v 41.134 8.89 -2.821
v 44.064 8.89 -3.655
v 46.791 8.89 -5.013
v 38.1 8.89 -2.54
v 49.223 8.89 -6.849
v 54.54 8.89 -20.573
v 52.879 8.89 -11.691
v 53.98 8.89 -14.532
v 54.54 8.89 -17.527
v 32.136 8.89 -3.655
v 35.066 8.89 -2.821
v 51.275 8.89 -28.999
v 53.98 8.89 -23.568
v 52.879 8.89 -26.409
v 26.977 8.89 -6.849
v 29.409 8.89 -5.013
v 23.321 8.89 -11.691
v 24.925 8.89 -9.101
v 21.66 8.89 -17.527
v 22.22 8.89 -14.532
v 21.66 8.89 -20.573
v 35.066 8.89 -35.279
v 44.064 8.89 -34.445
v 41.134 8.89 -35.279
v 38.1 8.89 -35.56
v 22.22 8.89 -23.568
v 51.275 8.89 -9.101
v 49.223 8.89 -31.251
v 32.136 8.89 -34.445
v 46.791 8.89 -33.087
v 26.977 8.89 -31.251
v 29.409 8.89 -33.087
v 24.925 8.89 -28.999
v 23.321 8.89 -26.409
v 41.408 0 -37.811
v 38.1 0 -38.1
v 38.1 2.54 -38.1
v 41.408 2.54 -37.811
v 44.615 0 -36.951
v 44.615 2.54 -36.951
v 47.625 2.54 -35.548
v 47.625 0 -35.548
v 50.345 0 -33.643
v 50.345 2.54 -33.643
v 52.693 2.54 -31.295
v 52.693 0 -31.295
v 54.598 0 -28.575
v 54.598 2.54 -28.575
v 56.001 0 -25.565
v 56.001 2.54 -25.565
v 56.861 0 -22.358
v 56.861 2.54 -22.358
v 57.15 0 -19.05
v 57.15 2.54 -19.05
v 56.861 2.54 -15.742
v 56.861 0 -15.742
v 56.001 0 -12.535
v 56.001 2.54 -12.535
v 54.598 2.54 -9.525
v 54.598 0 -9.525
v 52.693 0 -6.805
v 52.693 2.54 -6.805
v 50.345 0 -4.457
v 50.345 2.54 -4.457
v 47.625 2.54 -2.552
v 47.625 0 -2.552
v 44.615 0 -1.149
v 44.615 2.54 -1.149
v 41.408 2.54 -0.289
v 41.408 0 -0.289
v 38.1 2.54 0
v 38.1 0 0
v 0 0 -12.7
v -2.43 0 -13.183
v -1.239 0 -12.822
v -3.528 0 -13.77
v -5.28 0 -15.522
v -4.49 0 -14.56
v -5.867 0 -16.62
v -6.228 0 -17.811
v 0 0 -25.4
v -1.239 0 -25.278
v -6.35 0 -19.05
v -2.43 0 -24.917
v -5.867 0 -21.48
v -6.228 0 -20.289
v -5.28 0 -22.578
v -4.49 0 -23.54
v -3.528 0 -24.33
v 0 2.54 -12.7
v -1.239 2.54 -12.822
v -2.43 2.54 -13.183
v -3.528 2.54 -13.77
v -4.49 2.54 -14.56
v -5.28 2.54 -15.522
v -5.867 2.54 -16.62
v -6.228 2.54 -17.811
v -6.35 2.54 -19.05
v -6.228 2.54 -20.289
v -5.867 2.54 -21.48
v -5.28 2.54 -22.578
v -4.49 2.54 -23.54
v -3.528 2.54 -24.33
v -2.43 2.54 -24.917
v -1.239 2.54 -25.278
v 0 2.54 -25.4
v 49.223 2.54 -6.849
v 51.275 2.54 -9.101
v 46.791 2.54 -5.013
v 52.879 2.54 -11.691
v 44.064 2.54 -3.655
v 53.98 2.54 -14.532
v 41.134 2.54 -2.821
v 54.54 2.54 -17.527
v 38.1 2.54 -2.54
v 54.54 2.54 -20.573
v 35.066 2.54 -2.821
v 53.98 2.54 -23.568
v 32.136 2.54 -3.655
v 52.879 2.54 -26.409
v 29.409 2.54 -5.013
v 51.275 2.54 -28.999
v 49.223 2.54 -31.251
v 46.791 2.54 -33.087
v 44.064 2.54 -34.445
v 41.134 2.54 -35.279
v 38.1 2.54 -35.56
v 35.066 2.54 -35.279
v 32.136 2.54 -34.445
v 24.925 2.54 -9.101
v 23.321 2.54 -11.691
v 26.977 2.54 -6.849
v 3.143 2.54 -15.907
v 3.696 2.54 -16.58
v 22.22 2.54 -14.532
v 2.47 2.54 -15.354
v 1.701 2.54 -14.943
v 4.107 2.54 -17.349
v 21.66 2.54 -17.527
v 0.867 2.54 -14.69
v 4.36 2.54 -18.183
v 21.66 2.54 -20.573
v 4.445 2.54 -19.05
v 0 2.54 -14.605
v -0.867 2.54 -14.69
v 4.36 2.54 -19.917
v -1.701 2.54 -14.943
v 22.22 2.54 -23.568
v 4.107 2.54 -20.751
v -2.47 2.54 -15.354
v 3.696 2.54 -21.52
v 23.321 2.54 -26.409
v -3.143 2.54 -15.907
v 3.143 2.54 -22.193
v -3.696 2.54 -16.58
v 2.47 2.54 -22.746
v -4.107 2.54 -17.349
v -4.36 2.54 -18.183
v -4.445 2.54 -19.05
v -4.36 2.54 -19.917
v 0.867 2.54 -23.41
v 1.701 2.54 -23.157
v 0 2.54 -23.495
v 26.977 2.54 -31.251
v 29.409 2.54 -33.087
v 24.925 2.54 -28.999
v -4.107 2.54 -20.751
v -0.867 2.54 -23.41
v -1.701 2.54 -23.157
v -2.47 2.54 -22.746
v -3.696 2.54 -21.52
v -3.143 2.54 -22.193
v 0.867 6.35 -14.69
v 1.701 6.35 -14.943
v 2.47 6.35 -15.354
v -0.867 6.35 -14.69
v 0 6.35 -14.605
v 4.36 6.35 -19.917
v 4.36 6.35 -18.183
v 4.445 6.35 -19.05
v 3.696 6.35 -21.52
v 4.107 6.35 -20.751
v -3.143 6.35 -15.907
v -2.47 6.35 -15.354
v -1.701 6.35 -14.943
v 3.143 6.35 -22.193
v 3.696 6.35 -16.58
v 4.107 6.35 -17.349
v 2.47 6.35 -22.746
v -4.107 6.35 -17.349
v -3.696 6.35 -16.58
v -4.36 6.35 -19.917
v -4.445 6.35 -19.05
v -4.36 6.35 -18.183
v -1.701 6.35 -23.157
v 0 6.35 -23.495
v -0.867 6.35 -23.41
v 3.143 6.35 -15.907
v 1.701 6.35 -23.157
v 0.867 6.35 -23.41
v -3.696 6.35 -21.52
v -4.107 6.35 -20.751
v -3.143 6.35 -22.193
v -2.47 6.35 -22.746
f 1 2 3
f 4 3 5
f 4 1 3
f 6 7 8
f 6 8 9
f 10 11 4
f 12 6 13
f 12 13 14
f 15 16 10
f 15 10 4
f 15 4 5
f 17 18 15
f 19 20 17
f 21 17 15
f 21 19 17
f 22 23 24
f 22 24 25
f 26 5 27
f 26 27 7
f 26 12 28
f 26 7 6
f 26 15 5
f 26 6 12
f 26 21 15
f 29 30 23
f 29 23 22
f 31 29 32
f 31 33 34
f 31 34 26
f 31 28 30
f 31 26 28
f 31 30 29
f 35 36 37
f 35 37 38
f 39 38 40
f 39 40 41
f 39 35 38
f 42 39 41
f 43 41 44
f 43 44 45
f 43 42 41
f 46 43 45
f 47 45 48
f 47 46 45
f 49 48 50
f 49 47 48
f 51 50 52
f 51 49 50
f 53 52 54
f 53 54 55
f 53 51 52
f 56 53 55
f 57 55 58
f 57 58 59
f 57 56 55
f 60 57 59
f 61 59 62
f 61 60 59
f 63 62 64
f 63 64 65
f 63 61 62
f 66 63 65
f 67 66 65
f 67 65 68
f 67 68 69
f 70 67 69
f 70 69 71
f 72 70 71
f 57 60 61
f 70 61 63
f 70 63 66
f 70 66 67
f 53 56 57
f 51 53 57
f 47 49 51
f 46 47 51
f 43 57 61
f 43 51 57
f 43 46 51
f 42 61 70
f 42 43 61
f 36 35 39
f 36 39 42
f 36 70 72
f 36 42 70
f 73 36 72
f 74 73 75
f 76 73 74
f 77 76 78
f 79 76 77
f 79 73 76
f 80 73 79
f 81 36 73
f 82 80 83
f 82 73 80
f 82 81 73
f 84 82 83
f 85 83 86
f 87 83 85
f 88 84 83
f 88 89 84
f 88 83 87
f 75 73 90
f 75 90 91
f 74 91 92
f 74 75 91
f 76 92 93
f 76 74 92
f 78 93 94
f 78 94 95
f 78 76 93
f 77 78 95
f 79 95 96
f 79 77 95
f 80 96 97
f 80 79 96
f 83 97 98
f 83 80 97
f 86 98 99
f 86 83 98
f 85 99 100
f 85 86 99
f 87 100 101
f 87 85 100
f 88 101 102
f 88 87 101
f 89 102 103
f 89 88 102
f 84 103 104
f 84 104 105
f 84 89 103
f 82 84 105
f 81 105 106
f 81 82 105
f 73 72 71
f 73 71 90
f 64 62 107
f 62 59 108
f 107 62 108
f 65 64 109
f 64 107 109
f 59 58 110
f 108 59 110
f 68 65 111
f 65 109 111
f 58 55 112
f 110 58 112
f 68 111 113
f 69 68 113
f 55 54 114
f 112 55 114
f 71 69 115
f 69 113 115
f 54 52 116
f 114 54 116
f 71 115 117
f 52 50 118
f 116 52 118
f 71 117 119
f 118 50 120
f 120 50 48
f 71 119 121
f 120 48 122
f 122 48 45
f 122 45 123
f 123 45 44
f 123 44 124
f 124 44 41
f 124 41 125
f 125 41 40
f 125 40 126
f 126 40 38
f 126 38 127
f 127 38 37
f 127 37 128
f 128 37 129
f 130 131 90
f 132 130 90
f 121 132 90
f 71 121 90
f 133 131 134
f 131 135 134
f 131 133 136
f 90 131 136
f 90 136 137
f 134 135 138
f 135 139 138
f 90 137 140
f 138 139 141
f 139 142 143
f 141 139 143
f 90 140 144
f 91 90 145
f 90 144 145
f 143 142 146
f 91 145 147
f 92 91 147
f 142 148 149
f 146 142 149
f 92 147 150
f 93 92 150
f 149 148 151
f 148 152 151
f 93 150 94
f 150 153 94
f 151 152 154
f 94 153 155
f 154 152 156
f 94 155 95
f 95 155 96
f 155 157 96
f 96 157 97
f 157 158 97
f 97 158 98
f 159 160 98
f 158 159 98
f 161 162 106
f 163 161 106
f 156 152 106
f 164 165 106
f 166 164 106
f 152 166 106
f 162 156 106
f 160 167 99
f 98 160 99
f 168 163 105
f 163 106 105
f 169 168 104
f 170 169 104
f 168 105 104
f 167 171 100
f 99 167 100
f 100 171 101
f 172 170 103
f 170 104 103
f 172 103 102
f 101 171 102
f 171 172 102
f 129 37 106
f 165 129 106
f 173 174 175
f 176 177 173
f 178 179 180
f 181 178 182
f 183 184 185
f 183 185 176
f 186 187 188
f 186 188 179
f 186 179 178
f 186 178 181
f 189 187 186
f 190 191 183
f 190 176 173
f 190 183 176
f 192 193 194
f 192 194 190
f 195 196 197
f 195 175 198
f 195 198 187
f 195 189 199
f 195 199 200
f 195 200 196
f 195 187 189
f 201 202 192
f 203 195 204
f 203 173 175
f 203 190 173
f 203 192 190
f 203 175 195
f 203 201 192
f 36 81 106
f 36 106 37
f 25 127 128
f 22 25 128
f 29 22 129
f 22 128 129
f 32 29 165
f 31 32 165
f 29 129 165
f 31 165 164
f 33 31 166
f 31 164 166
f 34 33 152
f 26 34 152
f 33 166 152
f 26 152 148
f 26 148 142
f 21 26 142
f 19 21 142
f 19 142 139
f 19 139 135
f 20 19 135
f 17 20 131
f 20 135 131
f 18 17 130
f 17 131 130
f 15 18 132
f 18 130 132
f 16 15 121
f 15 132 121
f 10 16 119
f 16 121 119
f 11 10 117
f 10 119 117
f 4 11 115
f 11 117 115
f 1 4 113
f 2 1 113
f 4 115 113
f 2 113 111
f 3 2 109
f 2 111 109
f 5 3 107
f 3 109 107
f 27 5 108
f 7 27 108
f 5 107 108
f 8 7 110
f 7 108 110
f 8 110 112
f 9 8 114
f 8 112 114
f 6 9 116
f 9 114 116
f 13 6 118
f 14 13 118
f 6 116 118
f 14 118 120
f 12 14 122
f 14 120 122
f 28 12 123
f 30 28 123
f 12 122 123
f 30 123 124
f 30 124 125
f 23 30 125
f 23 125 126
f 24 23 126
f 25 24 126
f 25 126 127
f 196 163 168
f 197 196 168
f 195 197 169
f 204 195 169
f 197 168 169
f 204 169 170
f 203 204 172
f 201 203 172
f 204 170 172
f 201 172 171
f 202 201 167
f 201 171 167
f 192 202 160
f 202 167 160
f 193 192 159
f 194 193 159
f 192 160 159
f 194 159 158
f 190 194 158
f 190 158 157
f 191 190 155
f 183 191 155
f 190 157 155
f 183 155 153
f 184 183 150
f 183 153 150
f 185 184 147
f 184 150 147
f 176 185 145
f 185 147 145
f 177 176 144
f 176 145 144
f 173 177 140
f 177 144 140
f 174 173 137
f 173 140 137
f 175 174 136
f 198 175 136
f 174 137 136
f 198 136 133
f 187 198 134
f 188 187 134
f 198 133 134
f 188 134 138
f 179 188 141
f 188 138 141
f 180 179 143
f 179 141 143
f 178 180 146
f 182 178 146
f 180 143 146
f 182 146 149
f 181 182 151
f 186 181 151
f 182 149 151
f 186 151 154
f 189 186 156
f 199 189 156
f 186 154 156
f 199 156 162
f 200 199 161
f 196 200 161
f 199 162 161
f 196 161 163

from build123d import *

# Parameters (mm, degrees)
BOSS_EXTRUDE1_DEPTH = 2.54
SKETCH2_R           = 16.51
BOSS_EXTRUDE2_DEPTH = 6.35
SKETCH3_R           = 4.445
BOSS_EXTRUDE3_DEPTH = 3.81


with BuildPart() as part:
    # Sketch1 → Boss-Extrude1 (new body)
    with BuildSketch(Plane(origin=(0, 0, 0), x_dir=(1, 0, 0), z_dir=(0, 1, 0))):
        with BuildLine():
            Line((0, 25.4), (38.1, 38.1))
            ThreePointArc((38.1, 38.1), (57.15, 19.05), (38.1, 0))
            Line((38.1, 0), (0, 12.7))
            ThreePointArc((0, 12.7), (-6.35, 19.05), (0, 25.4))
        make_face()
    extrude(amount=BOSS_EXTRUDE1_DEPTH)

    # Sketch2 → Boss-Extrude2 (add)
    with BuildSketch(Plane(origin=(0, 2.54, 0), x_dir=(1, 0, 0), z_dir=(0, 1, 0))):
        with Locations(Location((38.1, 19.05, 0), (0, 0, 90))):
            Circle(SKETCH2_R)
    extrude(amount=BOSS_EXTRUDE2_DEPTH)

    # Sketch3 → Boss-Extrude3 (add)
    with BuildSketch(Plane(origin=(0, 2.54, 0), x_dir=(1, 0, 0), z_dir=(0, 1, 0))):
        with Locations(Location((0, 19.05, 0), (0, 0, 90))):
            Circle(SKETCH3_R)
    extrude(amount=BOSS_EXTRUDE3_DEPTH)


solid = part.part
